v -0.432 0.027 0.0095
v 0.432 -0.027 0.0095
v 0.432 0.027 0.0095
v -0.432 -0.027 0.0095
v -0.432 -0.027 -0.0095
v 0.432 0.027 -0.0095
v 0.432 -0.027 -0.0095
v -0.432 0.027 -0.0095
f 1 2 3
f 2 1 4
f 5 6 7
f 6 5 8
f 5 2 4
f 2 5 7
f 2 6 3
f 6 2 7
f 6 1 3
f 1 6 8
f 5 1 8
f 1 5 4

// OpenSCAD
// Dimension-calibrated (target: 0.02 x 0.86 x 0.05 mm)
scale([0.960000, 0.540000, 19.000000])
{
// Long thin rectangular strip (mm)
// Target bounding box: 0.9 x 0.1 x 0.0 (Z is effectively zero in drawings)
// Use a tiny non-zero thickness so OpenSCAD renders a visible solid.

strip_L = 0.9;     // length (X)
strip_W = 0.1;     // width  (Y)
strip_T = 0.001;   // thickness (Z) - minimal but non-zero for rendering

color([0.85, 0.85, 0.8])
cube([strip_L, strip_W, strip_T], center=true);
}
